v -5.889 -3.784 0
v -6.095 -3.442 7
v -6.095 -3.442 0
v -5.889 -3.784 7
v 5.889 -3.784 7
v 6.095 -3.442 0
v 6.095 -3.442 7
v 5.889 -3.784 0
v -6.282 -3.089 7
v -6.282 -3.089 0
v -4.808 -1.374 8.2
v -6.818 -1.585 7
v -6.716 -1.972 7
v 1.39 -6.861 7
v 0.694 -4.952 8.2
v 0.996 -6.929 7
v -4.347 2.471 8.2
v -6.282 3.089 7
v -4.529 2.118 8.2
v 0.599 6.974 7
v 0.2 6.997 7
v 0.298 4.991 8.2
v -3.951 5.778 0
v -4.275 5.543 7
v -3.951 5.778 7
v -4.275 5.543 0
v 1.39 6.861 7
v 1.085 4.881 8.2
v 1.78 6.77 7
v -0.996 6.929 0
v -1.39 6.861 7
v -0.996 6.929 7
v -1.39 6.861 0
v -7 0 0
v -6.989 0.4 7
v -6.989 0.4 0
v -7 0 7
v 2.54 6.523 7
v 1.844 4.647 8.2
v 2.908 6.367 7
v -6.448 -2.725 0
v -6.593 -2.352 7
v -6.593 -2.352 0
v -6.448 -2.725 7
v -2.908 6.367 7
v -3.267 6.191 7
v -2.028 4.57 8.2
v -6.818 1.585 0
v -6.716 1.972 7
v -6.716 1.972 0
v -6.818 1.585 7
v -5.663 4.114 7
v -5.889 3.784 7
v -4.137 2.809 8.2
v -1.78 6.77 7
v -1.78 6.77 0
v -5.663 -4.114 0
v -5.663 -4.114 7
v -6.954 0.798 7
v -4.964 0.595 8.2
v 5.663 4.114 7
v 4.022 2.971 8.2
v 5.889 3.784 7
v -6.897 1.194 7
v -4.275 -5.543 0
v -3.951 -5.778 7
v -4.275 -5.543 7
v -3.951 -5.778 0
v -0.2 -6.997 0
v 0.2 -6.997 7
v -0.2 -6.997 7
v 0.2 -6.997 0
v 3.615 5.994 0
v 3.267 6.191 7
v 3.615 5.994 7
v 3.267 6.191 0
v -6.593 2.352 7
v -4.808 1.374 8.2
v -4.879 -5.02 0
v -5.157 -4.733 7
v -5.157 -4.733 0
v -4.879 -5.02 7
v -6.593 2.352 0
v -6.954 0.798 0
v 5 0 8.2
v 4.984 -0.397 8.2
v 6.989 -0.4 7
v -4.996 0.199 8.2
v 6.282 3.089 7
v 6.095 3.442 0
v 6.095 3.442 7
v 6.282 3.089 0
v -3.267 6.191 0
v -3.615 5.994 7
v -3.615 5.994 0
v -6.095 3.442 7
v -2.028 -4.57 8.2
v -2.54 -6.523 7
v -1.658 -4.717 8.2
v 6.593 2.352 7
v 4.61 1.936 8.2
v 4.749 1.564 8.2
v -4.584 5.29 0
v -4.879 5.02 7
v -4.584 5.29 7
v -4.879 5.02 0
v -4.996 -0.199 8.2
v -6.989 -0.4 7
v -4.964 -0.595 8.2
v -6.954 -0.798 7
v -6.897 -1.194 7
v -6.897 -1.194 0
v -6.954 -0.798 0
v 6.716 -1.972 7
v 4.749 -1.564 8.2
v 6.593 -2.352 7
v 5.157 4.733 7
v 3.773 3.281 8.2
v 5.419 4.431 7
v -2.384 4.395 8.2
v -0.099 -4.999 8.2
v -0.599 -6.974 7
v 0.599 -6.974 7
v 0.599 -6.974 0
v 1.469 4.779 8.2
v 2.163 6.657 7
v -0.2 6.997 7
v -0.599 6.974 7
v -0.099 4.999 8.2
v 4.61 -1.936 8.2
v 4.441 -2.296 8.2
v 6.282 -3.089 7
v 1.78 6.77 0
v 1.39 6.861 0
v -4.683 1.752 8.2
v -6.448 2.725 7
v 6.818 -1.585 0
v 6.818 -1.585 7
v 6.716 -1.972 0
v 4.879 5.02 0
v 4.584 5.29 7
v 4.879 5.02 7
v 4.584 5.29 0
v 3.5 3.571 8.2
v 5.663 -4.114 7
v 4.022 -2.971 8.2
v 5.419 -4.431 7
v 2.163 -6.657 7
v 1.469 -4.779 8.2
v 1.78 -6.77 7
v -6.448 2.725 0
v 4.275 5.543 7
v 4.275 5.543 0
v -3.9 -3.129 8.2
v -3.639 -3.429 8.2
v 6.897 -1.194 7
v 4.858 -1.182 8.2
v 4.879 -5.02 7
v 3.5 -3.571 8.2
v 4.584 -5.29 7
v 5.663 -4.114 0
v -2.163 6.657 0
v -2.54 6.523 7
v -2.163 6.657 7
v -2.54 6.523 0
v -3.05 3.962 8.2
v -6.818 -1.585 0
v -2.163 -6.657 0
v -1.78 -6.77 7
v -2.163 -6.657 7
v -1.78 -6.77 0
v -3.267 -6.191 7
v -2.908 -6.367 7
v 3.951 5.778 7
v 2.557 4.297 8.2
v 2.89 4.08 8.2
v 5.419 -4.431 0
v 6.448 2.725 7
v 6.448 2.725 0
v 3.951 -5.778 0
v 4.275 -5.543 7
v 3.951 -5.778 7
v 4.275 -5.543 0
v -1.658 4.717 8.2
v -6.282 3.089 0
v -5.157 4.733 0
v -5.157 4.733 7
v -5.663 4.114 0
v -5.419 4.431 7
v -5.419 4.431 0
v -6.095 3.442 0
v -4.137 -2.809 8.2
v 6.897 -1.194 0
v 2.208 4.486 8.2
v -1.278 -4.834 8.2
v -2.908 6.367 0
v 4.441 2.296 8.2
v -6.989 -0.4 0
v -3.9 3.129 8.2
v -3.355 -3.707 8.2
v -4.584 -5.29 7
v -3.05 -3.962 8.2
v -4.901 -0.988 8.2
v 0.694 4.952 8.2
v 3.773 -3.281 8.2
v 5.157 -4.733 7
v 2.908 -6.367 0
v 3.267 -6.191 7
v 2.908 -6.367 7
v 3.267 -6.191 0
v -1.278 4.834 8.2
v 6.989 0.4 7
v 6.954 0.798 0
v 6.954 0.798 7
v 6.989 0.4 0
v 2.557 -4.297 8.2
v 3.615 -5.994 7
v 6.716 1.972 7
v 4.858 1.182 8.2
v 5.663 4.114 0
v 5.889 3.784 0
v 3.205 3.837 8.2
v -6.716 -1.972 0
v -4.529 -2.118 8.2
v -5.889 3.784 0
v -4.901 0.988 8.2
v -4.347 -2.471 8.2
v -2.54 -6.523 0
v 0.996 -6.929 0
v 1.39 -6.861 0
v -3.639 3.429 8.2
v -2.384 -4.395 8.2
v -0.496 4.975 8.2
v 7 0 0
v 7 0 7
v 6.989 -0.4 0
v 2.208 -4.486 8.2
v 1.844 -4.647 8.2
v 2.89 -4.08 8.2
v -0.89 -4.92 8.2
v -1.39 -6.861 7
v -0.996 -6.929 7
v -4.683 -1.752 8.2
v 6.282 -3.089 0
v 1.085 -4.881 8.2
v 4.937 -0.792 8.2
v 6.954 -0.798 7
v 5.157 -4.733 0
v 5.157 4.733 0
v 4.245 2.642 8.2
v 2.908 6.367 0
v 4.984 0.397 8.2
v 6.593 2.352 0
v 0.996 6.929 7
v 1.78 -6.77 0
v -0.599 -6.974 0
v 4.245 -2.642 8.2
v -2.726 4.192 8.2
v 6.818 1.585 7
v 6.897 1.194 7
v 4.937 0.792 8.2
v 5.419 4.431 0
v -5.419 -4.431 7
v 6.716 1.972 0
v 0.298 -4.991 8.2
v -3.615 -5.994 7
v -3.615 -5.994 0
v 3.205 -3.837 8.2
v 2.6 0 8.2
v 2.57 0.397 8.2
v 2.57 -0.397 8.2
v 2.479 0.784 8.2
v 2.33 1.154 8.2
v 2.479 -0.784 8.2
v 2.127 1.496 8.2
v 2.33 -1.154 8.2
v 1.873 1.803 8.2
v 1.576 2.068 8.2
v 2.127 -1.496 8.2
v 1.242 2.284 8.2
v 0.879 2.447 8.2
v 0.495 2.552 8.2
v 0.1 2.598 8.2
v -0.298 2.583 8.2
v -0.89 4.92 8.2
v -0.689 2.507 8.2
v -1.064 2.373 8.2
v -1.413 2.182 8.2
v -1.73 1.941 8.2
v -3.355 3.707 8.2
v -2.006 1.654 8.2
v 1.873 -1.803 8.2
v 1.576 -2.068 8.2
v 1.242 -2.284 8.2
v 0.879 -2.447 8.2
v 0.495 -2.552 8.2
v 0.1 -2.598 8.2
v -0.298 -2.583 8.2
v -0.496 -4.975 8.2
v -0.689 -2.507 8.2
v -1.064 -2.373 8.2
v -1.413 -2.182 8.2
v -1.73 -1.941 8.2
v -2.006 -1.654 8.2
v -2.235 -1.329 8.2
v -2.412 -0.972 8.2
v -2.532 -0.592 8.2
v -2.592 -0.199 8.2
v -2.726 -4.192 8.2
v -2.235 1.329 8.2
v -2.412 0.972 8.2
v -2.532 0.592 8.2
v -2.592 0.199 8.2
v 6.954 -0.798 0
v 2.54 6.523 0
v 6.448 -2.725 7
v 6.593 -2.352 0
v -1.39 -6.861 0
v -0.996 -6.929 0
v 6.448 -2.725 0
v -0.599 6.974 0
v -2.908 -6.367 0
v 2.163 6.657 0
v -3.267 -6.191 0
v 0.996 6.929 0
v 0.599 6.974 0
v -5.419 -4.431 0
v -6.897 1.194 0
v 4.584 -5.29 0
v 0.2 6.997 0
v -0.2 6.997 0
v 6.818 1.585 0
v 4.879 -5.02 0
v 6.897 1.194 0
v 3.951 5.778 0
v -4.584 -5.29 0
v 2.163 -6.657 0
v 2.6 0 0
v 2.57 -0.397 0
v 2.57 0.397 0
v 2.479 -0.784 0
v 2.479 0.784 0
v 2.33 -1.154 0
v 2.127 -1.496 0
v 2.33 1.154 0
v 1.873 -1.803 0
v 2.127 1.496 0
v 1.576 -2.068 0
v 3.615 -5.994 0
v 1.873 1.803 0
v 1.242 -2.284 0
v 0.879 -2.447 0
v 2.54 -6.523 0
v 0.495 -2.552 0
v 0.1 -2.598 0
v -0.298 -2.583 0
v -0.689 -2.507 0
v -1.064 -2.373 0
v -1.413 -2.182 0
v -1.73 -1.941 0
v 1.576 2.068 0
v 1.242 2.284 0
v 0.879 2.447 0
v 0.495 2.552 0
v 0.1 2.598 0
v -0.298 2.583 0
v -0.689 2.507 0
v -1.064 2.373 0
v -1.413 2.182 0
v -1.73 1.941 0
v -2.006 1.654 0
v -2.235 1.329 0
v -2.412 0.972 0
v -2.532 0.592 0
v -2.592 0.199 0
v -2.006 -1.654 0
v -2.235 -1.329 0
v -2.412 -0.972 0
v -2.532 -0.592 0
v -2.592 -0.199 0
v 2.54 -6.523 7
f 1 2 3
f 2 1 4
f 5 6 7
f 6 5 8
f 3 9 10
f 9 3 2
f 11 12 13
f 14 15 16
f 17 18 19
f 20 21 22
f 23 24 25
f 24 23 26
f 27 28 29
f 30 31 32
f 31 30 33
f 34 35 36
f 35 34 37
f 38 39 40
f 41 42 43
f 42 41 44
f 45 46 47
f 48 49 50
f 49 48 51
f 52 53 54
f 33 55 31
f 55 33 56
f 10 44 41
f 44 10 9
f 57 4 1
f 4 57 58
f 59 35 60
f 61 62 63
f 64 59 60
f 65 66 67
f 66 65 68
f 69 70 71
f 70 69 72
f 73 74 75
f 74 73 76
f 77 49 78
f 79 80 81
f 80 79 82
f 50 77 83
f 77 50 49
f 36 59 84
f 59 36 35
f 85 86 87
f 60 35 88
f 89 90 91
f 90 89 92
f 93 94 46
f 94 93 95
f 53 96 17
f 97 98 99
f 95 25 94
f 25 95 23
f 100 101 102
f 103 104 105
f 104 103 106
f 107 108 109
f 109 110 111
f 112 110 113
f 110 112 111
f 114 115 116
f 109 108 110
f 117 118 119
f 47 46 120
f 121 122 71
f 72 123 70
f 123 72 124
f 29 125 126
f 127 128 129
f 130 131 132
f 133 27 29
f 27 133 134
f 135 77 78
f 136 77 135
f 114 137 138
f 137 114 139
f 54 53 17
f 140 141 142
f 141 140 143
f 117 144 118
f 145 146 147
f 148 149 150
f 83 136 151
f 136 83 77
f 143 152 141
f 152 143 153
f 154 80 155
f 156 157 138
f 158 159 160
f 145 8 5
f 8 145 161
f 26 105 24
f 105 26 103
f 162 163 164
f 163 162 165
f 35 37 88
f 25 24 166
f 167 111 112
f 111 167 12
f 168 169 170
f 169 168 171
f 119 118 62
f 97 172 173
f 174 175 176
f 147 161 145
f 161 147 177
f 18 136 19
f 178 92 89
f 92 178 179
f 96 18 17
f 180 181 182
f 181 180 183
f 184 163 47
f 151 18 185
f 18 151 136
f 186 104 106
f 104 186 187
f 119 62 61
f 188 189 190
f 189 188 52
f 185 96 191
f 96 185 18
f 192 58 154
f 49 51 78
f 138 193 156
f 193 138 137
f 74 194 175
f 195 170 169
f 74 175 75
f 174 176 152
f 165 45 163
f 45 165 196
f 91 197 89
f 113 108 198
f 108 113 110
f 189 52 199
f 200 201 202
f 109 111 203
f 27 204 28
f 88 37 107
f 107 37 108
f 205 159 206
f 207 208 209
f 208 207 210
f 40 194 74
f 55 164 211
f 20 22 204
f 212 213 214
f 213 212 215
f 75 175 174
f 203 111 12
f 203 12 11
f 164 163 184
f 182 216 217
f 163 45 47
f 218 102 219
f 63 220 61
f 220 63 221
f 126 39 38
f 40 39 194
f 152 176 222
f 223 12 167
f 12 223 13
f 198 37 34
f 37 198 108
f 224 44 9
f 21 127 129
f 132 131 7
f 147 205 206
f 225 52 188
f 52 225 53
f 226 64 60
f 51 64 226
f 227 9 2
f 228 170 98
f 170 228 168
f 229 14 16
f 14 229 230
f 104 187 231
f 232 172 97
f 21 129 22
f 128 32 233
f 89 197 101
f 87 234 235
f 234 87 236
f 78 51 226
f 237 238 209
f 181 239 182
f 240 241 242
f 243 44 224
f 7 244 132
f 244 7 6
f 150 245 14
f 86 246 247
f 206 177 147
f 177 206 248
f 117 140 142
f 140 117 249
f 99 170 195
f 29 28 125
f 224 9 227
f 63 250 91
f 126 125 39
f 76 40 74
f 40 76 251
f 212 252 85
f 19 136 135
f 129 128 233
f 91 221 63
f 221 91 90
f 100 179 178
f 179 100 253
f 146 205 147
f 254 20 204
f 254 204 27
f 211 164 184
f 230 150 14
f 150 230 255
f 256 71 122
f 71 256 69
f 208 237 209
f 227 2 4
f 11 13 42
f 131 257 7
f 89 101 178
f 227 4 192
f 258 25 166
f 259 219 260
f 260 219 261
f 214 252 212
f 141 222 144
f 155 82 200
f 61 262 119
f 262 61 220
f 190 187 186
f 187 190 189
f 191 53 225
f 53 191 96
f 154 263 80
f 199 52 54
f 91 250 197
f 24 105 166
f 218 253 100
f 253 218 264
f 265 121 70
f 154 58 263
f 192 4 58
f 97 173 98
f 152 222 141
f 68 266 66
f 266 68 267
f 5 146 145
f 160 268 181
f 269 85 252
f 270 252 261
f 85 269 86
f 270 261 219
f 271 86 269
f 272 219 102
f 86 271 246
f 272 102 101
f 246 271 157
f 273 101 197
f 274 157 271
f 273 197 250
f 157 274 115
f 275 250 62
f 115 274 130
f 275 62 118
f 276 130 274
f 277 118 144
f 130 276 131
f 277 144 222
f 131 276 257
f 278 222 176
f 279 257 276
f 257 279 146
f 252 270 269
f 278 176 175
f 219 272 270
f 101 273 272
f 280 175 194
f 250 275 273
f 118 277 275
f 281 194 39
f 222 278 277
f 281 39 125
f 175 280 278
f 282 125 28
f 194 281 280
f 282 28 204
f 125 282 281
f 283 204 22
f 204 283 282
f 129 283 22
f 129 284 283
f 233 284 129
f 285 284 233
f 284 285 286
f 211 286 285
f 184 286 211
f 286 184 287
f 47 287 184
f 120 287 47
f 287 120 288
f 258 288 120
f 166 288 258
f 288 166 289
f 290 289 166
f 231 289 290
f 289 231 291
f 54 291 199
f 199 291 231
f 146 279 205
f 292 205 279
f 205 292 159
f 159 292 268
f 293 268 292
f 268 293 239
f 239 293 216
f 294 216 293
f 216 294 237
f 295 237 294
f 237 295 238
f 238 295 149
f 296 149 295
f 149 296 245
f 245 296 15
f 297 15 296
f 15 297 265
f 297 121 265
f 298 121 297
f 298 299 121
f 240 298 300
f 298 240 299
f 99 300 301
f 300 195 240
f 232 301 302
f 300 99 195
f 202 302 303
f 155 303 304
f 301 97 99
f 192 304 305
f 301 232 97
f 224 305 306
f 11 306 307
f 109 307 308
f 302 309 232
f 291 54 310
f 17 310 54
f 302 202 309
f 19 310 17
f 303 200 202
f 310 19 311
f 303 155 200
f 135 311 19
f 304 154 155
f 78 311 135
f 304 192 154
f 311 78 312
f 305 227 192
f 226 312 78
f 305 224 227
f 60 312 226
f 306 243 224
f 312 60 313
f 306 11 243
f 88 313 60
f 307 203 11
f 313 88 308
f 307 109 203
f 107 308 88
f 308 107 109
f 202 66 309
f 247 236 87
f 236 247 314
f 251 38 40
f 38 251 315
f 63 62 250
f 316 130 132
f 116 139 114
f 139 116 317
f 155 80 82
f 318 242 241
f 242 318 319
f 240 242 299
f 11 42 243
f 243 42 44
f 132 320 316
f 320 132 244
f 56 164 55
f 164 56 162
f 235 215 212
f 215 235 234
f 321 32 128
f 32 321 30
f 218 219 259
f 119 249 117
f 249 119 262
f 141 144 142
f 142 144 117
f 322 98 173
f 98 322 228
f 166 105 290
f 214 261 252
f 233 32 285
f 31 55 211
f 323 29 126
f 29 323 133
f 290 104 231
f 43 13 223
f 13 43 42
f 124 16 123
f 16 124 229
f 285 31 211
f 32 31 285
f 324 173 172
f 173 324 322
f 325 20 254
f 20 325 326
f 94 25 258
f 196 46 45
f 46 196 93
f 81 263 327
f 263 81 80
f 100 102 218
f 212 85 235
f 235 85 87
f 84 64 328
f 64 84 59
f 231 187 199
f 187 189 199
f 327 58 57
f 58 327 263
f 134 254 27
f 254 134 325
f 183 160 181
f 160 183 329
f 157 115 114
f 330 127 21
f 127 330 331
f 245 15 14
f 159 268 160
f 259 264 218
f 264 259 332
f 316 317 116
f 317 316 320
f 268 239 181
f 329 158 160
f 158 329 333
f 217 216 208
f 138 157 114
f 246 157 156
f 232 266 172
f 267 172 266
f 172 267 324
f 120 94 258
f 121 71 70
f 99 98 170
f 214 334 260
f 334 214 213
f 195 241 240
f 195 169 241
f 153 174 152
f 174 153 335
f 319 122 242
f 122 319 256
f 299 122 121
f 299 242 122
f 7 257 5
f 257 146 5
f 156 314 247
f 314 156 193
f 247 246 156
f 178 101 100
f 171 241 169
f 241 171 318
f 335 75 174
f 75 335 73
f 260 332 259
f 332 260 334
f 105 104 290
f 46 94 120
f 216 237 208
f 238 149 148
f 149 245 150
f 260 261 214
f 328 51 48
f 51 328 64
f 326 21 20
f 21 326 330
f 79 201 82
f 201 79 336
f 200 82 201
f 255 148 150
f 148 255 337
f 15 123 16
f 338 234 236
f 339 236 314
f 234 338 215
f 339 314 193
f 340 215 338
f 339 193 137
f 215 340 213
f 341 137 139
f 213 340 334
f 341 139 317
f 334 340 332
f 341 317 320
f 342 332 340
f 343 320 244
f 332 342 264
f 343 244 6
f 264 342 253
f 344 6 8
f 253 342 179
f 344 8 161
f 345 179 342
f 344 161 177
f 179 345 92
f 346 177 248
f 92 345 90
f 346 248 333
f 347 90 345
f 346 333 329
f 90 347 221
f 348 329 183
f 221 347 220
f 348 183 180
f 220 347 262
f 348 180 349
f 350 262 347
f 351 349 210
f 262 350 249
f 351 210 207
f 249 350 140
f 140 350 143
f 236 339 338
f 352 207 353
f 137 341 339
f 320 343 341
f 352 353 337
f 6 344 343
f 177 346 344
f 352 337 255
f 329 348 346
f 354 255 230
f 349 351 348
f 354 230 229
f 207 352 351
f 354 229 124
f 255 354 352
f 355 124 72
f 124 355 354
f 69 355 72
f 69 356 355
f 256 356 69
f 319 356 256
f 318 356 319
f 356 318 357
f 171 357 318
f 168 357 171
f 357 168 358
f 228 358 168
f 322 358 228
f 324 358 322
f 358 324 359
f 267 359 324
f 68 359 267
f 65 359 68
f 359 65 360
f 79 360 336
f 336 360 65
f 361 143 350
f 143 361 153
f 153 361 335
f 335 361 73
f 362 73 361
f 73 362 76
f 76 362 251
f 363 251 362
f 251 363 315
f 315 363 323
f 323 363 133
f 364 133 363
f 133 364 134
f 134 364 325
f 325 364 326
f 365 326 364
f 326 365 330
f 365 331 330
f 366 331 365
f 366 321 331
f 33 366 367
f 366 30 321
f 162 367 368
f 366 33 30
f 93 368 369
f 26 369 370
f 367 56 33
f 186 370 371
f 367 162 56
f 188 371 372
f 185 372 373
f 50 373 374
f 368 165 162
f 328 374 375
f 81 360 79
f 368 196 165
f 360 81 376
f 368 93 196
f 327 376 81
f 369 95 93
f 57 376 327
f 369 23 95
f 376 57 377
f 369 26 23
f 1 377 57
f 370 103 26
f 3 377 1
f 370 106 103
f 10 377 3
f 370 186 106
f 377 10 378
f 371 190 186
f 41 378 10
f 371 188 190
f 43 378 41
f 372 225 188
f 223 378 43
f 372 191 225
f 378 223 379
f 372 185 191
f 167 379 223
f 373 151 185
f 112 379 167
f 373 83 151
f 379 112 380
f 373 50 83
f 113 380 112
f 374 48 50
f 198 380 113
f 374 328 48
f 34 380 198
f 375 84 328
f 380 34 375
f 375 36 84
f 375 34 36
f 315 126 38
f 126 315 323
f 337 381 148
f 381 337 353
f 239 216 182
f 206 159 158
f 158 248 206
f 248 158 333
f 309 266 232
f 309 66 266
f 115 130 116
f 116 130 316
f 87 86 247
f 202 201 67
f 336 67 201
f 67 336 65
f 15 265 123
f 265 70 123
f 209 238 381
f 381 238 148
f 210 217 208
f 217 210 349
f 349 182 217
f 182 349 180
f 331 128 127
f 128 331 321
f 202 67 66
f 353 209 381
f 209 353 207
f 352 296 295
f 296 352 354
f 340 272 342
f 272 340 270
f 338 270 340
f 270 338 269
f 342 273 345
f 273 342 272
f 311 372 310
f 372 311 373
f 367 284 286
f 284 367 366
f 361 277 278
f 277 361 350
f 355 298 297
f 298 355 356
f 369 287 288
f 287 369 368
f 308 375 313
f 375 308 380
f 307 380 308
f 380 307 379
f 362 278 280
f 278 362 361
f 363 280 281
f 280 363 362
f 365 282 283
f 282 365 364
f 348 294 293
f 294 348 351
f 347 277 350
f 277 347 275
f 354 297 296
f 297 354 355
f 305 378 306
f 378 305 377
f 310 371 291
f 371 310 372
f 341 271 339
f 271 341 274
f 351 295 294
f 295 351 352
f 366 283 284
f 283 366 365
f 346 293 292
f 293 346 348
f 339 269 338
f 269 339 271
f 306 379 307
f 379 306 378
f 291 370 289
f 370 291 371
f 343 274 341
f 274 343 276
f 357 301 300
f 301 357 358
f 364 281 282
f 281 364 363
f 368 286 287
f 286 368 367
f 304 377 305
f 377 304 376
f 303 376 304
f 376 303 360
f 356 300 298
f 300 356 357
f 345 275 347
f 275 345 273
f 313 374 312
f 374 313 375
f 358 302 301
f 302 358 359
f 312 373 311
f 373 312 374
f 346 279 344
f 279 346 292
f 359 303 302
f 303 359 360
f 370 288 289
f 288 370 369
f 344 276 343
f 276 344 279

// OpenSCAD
$fa = 2;
$fs = 0.4;

module prop_hub() {
  color("#e8e8e8")
    difference() {
      hull() {
        cylinder(h = 7, d = 14);
        translate([0, 0, 8])
          cylinder(h = 0.2, d = 10);
      }
      translate([0, 0, -1])
        cylinder(h = 12, d = 5.2);
    }
}

prop_hub();
